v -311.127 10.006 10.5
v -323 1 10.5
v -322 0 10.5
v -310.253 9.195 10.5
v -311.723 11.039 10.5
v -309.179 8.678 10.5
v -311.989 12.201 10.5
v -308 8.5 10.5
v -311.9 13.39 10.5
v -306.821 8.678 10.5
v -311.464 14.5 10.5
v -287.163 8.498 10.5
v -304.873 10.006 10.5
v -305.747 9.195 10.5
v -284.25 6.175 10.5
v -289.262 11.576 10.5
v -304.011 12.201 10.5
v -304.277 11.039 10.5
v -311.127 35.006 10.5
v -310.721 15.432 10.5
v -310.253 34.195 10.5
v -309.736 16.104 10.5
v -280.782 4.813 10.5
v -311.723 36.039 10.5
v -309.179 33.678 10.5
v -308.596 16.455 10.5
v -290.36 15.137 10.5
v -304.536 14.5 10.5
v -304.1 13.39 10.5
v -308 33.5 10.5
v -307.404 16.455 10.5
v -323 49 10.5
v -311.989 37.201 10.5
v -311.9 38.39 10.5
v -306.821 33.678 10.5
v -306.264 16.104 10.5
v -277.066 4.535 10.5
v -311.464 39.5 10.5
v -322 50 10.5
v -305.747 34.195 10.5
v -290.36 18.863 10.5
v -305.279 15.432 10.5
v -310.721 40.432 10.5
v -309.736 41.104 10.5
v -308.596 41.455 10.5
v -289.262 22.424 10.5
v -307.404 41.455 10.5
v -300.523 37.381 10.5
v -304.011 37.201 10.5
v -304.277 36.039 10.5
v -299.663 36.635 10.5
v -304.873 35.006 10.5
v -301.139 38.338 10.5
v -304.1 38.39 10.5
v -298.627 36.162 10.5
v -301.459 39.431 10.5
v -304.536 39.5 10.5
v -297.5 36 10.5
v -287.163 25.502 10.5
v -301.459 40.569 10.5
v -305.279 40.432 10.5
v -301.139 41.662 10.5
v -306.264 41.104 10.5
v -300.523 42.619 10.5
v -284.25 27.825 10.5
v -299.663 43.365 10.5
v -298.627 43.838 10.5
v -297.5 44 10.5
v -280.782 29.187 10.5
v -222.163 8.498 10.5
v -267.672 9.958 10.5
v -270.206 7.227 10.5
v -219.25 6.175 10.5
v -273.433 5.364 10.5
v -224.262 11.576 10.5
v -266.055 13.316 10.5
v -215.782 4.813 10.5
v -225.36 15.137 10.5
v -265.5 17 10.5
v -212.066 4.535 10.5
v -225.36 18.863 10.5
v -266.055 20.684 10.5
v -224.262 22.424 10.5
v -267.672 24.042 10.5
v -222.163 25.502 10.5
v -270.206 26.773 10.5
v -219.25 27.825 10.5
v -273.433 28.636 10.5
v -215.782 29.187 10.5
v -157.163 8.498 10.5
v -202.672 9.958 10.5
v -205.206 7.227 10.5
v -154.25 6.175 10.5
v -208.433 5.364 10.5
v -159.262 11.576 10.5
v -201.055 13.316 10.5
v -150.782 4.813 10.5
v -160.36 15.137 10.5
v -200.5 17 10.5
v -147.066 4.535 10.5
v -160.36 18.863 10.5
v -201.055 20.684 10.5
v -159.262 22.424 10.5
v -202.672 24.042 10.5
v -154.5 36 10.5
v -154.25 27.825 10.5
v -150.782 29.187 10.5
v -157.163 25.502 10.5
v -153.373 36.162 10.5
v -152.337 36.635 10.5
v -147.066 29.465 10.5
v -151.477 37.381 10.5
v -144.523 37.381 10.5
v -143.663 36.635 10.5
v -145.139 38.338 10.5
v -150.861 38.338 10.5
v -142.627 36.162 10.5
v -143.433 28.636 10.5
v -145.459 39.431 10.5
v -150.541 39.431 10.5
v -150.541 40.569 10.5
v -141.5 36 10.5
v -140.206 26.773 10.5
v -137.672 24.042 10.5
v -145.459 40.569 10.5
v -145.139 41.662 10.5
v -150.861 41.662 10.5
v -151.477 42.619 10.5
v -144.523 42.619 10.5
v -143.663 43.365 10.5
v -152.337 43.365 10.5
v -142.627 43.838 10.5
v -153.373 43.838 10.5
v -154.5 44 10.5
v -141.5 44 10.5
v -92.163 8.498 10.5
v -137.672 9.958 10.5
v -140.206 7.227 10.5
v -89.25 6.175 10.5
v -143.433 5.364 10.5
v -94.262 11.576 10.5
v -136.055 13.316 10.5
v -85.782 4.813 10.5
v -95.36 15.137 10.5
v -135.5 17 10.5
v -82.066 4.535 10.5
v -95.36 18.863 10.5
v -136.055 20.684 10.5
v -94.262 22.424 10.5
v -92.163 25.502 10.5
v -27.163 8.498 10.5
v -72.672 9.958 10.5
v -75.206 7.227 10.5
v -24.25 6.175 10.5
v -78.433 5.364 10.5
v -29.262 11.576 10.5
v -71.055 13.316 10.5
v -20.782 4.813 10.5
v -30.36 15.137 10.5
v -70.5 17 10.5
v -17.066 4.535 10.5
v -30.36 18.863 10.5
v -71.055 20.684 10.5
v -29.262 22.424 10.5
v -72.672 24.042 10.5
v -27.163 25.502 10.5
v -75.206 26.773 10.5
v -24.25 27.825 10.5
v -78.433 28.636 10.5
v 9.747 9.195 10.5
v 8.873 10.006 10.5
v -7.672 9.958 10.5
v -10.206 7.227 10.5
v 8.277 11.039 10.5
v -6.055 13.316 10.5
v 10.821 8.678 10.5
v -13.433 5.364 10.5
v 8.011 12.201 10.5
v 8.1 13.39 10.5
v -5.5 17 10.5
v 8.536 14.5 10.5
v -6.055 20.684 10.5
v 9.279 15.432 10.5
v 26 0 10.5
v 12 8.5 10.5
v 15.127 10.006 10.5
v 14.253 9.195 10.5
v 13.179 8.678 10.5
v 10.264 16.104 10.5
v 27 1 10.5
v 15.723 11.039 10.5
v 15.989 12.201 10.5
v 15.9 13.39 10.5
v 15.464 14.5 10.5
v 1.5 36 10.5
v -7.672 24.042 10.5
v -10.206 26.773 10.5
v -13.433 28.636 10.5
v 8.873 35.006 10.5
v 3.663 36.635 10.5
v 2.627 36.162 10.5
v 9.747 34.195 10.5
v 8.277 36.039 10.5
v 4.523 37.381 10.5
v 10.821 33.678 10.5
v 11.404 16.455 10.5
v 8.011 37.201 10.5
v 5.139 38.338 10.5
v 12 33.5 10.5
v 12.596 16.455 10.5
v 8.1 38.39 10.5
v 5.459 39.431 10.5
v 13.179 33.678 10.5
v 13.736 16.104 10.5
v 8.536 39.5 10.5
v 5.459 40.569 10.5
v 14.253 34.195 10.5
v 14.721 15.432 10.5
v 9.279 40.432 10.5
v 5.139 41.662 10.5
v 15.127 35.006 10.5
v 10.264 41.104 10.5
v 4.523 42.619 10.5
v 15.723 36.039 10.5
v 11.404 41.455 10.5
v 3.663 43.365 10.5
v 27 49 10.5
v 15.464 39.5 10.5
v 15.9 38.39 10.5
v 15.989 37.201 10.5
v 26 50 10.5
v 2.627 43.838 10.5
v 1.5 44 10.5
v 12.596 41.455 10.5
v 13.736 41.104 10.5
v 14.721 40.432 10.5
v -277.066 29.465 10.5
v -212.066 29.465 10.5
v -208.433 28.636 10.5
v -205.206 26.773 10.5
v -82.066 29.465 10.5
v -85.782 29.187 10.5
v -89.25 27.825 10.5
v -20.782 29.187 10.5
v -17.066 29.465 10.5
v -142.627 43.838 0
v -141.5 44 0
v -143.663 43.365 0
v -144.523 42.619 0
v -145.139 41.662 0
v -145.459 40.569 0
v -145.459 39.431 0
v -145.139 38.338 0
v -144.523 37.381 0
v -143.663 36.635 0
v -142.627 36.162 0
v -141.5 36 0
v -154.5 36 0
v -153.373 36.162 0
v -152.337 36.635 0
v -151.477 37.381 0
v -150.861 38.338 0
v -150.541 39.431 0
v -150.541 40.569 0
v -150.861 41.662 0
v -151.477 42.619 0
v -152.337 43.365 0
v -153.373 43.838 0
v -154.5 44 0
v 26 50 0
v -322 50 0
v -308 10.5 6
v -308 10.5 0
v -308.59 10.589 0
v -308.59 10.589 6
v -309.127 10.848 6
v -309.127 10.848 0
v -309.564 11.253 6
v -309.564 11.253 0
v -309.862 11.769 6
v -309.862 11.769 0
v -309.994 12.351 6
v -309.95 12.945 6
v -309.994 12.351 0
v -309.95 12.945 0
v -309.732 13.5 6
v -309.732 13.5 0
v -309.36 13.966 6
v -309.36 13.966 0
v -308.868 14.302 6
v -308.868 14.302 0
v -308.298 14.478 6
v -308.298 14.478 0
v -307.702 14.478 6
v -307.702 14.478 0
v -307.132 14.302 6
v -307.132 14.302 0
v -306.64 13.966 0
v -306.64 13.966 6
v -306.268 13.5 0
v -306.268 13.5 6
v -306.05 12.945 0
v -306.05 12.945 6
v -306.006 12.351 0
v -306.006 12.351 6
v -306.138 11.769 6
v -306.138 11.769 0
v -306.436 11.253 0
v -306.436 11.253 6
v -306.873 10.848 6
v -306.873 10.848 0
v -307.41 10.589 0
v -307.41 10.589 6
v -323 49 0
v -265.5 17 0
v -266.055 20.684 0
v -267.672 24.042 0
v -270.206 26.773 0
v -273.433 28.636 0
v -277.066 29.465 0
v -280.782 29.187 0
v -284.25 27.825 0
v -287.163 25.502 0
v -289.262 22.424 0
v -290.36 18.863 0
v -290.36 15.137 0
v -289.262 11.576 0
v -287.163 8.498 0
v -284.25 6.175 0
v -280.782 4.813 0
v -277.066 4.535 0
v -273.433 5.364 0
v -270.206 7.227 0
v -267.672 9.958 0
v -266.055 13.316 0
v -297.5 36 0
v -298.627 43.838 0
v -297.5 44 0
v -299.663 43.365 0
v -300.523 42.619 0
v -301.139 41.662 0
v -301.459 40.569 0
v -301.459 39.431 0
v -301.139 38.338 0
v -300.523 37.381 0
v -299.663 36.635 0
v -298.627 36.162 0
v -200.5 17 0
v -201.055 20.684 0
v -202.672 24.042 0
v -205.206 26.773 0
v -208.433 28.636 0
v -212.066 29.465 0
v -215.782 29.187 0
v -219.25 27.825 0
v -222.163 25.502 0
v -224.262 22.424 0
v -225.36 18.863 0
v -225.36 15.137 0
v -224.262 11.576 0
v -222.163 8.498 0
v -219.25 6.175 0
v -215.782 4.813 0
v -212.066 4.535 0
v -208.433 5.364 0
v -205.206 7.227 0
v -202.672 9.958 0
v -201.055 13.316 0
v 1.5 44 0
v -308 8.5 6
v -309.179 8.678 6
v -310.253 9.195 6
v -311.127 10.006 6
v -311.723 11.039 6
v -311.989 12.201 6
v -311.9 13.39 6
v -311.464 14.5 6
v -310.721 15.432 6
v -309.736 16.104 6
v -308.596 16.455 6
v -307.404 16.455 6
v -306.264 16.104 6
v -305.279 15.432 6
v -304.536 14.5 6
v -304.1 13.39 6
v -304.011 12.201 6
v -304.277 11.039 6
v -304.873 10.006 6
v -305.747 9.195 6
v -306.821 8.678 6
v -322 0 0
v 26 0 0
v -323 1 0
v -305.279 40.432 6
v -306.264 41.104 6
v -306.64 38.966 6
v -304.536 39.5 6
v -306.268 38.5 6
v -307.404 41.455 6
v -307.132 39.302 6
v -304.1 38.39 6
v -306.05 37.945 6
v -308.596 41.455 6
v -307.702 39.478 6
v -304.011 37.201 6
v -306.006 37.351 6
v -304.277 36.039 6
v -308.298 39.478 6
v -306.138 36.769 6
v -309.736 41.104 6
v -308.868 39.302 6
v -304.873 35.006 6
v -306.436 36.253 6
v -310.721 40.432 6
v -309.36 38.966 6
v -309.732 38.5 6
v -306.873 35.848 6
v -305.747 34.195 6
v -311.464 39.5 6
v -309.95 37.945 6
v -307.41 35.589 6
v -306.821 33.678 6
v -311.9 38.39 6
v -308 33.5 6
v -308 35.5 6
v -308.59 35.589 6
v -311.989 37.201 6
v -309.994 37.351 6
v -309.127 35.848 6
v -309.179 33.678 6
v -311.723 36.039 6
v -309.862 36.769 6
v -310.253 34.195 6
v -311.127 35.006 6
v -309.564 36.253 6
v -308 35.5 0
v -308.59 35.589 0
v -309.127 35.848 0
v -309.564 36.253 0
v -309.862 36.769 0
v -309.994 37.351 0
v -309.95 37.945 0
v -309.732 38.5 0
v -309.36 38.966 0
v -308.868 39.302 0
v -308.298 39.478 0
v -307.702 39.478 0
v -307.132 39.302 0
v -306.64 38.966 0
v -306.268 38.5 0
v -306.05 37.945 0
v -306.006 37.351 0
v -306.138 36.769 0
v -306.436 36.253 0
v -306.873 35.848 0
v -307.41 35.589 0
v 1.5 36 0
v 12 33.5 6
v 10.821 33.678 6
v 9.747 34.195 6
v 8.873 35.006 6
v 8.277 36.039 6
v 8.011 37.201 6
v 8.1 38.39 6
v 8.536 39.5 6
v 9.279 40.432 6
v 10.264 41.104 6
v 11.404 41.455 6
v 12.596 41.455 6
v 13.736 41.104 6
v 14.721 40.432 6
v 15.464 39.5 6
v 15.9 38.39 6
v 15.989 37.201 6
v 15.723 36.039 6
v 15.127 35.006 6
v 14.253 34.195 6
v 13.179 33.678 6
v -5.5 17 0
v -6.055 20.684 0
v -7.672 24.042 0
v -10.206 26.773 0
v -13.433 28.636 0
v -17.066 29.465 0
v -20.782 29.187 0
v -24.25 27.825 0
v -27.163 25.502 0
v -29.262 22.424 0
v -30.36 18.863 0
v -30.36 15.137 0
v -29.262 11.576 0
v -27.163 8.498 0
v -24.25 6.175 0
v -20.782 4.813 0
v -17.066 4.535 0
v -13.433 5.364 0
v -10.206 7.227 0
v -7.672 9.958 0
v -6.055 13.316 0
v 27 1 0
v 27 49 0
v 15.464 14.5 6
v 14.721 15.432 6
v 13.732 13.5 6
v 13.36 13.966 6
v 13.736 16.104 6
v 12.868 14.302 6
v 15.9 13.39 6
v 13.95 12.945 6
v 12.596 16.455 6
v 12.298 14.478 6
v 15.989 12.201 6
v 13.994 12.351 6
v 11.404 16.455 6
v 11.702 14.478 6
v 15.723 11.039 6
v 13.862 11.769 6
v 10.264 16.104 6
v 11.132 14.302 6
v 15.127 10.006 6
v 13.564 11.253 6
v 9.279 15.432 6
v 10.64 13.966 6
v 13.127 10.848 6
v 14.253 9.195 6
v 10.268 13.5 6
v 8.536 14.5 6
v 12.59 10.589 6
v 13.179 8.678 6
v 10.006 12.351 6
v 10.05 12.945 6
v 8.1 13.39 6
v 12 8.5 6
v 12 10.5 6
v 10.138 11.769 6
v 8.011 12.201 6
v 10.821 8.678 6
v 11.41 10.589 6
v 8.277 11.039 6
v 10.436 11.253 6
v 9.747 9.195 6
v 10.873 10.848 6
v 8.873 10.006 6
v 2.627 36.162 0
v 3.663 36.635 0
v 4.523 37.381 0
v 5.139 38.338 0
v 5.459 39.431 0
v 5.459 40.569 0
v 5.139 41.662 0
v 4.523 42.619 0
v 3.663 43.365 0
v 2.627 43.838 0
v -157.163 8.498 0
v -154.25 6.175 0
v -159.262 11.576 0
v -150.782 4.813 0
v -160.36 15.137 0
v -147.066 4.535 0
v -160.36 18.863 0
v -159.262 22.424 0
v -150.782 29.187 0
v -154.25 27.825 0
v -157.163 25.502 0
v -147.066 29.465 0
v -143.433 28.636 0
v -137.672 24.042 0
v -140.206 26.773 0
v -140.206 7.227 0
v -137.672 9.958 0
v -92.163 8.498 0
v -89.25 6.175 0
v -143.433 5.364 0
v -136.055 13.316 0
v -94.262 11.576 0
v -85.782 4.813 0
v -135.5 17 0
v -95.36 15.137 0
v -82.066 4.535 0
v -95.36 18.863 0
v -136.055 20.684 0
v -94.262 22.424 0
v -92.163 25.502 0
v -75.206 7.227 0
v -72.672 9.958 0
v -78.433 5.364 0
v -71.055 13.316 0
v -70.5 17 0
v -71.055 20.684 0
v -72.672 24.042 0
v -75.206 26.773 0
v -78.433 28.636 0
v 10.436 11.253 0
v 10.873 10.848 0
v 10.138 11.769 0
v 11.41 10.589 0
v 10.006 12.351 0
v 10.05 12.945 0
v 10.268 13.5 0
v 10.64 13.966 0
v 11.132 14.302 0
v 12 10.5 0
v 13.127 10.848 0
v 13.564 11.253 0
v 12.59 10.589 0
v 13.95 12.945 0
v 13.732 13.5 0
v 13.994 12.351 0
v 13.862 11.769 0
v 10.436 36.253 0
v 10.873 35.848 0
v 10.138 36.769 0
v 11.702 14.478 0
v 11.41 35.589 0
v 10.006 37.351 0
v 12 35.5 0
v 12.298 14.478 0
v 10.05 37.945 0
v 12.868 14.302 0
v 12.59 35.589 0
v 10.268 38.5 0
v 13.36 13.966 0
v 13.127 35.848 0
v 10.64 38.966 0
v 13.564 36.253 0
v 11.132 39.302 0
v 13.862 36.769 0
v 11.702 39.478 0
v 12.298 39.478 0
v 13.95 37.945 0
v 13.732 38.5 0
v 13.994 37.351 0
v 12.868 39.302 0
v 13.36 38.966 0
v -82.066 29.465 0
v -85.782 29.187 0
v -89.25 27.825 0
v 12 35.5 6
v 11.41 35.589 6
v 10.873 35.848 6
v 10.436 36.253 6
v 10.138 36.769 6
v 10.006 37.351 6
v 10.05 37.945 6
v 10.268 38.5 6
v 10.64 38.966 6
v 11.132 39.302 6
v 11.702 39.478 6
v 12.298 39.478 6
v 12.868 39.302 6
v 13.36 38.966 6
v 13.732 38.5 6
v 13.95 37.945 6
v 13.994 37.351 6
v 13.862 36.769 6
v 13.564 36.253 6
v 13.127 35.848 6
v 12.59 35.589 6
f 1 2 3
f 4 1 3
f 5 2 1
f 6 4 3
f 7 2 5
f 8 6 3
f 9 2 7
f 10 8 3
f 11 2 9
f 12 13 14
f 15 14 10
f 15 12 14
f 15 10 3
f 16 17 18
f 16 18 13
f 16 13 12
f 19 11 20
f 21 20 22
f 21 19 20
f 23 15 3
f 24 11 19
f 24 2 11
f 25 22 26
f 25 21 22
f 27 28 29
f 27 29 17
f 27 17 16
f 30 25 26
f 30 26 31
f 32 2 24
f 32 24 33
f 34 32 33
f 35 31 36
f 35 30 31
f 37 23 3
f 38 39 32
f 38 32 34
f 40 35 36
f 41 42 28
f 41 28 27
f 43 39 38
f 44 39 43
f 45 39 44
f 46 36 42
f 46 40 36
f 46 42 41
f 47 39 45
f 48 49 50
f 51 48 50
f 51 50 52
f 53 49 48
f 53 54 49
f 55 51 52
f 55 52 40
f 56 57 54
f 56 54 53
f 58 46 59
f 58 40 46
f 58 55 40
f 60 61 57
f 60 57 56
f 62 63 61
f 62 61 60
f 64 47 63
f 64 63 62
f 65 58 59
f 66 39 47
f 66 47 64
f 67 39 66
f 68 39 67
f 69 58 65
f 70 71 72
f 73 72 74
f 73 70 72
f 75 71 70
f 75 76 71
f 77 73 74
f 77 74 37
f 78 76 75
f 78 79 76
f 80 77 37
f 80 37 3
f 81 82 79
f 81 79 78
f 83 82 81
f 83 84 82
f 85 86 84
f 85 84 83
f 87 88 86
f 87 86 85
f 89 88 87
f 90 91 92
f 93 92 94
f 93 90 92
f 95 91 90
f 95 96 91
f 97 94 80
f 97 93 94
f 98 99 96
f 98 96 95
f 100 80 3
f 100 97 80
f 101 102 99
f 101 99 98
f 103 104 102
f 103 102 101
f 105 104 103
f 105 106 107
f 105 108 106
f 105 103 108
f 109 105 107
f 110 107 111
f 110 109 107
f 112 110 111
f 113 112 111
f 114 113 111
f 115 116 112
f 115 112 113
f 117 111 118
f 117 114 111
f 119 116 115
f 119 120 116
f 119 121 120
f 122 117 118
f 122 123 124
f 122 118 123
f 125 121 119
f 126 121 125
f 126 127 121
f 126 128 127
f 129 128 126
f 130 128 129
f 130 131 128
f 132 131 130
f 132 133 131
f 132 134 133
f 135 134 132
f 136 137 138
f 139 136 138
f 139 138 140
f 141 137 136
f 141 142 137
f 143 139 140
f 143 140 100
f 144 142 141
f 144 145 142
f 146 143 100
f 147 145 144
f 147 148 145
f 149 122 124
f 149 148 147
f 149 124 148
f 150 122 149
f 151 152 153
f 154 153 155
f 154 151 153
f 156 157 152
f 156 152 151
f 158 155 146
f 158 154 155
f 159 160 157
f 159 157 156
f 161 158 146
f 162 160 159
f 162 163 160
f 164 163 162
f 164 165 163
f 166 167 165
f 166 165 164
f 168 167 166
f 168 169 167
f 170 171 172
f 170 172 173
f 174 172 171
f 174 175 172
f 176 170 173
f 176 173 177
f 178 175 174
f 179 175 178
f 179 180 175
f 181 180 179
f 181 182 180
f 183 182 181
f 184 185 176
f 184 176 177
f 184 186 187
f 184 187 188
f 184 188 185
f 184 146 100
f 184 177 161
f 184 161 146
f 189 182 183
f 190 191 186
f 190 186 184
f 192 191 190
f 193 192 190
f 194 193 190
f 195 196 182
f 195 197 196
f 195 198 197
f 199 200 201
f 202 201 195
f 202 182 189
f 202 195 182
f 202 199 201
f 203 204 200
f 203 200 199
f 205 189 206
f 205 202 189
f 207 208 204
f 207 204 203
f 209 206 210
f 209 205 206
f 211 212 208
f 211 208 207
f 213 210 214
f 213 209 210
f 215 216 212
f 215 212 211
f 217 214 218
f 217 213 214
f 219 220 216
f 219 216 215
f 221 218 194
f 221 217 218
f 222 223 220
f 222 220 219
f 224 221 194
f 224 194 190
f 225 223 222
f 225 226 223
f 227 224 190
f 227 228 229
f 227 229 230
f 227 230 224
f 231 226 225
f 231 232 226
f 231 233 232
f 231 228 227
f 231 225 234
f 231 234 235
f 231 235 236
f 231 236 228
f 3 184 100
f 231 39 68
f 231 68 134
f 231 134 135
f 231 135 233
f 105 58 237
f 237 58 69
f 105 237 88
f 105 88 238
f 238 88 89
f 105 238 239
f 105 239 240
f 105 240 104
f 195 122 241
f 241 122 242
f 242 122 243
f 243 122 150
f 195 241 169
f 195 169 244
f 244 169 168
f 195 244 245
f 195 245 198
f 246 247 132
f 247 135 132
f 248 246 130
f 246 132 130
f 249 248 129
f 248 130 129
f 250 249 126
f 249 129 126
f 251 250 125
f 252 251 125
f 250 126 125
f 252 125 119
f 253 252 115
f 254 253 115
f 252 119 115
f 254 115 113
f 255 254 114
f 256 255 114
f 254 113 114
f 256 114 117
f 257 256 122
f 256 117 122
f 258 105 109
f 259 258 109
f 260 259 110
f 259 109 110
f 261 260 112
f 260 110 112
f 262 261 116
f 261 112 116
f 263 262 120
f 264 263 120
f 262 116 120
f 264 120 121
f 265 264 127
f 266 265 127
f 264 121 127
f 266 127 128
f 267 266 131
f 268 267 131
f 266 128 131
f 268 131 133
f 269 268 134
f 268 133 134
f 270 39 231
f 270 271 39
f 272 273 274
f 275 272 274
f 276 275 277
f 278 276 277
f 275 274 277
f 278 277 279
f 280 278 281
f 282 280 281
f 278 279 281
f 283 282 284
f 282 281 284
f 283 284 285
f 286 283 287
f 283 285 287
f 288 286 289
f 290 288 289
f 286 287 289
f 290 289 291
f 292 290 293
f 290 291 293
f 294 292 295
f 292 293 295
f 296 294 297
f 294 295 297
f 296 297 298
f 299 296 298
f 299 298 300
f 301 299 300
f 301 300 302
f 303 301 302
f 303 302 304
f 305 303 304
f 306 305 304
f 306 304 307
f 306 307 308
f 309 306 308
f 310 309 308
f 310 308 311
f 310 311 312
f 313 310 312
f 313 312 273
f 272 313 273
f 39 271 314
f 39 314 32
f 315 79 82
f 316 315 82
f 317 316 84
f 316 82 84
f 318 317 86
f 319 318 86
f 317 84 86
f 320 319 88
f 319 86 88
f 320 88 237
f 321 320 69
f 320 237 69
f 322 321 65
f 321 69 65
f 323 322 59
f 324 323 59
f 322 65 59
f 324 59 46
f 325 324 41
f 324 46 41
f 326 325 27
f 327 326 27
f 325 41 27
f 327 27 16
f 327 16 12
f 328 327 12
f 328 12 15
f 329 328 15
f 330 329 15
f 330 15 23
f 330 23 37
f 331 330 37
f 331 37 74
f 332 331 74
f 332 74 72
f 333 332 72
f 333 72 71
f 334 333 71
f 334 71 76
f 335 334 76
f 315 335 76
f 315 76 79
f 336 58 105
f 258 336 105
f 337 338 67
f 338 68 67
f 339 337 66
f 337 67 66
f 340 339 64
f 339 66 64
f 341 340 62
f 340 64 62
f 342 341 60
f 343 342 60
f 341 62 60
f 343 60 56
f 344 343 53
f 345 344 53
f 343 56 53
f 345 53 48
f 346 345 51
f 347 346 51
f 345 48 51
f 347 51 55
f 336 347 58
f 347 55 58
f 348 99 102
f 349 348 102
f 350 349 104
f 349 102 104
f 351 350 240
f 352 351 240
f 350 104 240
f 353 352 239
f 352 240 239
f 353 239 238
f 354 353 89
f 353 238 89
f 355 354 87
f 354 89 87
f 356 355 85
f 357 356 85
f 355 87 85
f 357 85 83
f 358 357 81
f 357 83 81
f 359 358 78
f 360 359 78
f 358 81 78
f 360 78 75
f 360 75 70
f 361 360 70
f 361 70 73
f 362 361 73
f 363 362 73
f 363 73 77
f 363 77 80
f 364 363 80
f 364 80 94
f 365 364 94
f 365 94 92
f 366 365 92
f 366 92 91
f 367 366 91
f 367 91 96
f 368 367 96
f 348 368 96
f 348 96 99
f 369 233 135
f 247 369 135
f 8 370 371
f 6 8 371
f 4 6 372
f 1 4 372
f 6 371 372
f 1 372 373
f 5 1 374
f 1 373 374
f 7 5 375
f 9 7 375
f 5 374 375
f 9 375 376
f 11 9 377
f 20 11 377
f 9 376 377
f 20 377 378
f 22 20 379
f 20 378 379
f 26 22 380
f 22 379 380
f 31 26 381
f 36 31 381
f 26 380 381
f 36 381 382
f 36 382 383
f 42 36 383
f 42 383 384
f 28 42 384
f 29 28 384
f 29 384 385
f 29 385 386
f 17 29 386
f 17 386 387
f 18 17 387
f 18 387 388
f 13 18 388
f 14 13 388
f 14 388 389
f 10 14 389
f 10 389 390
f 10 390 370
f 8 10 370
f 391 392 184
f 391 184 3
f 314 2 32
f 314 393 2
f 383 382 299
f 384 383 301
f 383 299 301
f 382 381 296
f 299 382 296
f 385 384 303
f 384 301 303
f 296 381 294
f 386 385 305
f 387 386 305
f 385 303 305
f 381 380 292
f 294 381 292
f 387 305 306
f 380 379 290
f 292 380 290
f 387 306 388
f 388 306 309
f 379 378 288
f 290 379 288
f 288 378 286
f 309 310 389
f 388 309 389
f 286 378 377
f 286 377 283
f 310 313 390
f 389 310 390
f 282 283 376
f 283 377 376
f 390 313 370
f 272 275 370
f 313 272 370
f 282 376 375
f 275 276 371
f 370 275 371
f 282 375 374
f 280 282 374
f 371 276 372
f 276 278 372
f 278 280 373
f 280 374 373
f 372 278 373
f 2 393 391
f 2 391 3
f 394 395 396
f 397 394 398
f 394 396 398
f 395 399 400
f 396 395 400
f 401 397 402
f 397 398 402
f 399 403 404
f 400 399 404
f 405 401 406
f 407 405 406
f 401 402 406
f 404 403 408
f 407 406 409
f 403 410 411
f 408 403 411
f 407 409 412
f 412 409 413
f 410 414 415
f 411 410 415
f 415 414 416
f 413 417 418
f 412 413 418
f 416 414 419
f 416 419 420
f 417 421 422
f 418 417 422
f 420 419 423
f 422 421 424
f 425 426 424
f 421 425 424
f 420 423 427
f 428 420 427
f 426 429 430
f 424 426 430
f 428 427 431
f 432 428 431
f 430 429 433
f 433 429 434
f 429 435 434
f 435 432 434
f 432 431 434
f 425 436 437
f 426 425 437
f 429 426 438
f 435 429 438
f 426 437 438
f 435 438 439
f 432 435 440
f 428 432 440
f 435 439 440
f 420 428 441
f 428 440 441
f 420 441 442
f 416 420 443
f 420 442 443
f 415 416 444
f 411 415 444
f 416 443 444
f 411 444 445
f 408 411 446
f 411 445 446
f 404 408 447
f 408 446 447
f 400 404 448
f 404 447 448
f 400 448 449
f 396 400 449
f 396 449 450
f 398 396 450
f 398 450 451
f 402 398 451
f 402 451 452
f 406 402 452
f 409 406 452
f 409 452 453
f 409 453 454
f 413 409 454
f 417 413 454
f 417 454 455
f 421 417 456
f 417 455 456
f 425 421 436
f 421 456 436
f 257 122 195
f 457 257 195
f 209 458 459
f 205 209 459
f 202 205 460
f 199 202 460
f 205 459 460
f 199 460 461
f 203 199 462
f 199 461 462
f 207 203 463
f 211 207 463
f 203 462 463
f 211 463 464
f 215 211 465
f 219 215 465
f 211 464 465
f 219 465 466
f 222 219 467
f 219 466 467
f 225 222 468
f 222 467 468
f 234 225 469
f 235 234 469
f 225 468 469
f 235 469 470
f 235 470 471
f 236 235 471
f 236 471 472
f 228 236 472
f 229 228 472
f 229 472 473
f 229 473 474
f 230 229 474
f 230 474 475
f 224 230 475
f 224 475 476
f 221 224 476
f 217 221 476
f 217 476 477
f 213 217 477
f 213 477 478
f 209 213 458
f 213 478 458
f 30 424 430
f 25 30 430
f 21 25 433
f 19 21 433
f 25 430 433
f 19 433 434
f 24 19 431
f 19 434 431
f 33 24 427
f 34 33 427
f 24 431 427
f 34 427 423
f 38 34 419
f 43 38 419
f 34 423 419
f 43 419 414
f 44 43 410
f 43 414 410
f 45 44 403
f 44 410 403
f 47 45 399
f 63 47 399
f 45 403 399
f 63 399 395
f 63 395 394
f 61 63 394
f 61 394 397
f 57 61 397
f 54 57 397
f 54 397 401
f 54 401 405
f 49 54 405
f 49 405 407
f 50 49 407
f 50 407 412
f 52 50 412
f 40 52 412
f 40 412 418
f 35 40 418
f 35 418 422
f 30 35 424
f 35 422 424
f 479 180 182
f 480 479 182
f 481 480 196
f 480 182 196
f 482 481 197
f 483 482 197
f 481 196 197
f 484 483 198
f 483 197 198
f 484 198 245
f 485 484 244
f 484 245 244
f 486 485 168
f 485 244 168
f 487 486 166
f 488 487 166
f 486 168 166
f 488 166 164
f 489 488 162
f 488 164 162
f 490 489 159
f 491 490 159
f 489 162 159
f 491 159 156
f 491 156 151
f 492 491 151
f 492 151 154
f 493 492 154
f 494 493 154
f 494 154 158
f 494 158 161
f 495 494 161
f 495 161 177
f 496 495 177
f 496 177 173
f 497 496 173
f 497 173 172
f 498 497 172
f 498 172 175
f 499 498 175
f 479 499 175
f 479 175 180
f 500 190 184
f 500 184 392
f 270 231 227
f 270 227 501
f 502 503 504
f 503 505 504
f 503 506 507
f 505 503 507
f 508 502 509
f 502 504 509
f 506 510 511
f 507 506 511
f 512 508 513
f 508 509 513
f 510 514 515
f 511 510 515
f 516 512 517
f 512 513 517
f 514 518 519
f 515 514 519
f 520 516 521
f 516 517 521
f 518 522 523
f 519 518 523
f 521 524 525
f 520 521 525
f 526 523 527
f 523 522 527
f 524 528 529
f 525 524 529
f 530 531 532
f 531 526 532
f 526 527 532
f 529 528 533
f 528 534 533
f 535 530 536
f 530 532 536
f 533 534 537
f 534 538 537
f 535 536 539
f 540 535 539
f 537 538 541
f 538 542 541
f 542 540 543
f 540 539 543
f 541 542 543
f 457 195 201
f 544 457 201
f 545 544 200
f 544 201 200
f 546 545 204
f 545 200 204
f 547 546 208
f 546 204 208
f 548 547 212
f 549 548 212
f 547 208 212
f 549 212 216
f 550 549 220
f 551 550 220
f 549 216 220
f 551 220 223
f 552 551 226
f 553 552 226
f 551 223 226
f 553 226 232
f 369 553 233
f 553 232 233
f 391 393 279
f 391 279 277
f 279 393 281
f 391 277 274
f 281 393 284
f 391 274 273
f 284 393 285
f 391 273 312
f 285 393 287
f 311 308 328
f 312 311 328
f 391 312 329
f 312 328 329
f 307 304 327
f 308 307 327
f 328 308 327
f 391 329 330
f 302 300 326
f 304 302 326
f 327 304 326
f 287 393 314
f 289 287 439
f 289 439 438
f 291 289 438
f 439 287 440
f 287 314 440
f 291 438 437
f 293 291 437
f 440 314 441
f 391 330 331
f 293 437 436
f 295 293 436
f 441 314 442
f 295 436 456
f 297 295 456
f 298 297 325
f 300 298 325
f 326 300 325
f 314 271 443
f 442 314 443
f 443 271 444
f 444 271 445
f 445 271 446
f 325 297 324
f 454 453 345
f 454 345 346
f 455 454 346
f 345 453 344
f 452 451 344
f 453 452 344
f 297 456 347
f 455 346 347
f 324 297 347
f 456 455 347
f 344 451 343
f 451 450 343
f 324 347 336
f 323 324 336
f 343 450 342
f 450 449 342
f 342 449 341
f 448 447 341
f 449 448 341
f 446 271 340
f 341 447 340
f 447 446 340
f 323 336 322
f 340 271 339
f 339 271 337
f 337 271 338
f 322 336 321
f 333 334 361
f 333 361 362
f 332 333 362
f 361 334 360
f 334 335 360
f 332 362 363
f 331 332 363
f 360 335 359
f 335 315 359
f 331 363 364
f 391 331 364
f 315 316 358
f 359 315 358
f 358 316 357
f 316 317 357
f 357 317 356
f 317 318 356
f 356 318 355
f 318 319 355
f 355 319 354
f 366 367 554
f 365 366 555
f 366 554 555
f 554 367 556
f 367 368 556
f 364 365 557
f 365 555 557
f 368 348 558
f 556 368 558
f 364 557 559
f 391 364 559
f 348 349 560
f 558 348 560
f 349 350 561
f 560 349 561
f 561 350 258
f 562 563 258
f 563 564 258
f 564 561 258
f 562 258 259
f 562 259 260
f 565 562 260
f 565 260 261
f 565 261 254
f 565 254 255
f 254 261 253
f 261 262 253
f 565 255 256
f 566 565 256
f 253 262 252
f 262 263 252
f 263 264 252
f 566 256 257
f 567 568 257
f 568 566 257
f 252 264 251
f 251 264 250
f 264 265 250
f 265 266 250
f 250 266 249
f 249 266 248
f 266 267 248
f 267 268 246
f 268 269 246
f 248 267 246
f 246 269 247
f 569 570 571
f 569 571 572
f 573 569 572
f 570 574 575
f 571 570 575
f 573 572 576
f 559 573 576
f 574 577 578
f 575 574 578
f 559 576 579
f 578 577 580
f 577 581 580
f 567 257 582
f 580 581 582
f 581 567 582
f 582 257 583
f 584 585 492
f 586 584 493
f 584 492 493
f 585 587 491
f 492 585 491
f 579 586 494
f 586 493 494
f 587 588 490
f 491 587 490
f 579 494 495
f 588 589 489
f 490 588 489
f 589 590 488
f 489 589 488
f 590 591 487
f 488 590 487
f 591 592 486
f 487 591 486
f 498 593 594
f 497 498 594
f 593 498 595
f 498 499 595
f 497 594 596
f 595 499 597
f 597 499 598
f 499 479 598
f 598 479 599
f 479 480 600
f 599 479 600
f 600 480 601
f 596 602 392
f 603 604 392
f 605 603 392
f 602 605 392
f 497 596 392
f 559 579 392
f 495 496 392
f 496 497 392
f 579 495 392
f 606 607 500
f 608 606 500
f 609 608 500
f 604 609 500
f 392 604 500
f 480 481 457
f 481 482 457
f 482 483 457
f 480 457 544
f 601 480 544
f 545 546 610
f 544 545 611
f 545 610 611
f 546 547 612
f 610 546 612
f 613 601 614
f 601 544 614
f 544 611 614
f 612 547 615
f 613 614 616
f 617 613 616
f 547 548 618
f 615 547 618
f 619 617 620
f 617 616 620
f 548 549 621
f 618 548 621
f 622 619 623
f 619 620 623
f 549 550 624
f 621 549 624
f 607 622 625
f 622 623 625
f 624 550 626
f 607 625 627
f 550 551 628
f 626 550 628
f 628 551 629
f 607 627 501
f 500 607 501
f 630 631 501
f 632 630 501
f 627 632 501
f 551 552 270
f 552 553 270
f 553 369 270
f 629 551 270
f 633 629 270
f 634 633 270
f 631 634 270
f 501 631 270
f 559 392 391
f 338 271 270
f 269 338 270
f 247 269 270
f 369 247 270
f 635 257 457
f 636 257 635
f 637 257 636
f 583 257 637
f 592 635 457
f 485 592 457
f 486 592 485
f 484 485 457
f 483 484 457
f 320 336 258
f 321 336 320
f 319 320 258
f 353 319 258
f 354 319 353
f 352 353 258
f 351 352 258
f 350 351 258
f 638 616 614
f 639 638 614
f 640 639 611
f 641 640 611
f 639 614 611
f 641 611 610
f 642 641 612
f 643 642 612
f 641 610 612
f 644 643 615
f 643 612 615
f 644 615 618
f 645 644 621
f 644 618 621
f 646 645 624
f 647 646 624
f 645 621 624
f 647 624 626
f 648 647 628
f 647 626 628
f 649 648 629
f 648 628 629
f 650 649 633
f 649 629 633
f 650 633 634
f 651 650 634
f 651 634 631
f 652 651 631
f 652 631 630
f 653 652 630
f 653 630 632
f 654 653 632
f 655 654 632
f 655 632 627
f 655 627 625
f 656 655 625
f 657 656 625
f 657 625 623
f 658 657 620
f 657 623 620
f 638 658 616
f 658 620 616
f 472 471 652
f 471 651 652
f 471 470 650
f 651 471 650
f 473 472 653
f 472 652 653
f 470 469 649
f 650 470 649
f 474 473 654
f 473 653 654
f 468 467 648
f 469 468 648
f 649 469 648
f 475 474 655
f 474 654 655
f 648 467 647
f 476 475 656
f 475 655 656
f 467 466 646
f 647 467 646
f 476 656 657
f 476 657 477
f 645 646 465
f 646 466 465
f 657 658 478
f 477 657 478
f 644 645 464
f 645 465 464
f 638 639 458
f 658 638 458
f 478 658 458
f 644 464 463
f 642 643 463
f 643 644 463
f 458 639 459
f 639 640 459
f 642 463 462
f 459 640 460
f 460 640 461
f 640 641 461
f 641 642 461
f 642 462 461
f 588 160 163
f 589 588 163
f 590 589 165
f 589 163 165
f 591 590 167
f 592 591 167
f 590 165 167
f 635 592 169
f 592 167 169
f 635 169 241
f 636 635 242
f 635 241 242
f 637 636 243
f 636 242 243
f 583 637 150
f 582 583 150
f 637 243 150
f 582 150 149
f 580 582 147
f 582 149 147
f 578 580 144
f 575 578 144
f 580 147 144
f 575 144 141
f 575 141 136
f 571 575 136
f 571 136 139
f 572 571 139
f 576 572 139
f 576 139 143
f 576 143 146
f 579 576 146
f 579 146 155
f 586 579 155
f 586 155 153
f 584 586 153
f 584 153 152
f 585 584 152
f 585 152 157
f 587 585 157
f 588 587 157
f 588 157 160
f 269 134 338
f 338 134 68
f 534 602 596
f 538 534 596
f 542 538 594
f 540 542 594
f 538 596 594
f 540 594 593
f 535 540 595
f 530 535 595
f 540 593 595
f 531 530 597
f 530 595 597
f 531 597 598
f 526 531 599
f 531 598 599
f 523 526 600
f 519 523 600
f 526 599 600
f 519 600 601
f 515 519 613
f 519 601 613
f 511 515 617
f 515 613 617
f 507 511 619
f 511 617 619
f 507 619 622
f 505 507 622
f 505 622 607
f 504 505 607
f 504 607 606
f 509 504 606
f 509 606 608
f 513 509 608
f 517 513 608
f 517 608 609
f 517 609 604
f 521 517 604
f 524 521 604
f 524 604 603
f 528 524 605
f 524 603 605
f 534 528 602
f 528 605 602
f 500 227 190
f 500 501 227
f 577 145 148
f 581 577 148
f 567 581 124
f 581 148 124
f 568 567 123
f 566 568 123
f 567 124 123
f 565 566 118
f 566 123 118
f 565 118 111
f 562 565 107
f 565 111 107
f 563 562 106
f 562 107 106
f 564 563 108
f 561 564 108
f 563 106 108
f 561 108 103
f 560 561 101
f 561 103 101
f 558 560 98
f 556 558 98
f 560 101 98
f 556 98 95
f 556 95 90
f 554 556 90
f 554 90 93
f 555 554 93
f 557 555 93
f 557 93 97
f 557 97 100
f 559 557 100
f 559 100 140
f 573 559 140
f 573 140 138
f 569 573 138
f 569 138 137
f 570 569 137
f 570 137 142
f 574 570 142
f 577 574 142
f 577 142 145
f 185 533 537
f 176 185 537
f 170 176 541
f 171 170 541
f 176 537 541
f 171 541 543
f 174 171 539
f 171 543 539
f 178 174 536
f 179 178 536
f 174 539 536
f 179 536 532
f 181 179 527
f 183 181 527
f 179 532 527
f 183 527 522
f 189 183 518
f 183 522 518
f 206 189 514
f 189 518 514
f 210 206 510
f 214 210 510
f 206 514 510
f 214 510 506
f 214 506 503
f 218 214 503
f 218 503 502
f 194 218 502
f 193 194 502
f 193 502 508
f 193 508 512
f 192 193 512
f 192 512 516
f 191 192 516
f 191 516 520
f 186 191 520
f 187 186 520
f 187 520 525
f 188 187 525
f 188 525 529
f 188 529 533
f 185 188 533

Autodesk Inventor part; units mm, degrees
ref_plane "YZ Plane" through (0, 0, 0) normal (1, 0, 0) x (0, 1, 0)
ref_plane "XZ Plane" through (0, 0, 0) normal (0, 1, 0) x (-1, 0, 0)
ref_plane "XY Plane" through (0, 0, 0) normal (0, 0, 1) x (1, 0, 0)
sketch "Esboço1" plane through (0, 0, 0) normal (0, 0, 1) x (1, 0, 0)
  line L0 (-293, 0) -> (-323, 0) construction
  line L1 (-323, 0) -> (-323, 50) construction
  line L2 (27, 0) -> (27, 50) construction
  line L3 (27, 0) -> (0, 0) construction
  line L4 (-3, 50) -> (27, 50) construction
  line L5 (-323, 50) -> (-293, 50) construction
  line L6 (27, 0) -> (-323, 0)
  line L7 (-323, 0) -> (-323, 50)
  line L8 (-323, 50) -> (27, 50)
  line L9 (27, 50) -> (27, 0)
extrude "bloco principal" add sketch "Esboço1" along normal blind 10.5
sketch "Esboço4" plane through (0, 0, 10.5) normal (0, 0, 1) x (1, 0, 0)
  line L0 (27, 0) -> (27, 50) projected
  line L1 (27, 40) -> (-323, 40) construction
  line L2 (-323, 50) -> (-323, 0) projected
  line L3 (5.5, 40) -> (-145.5, 40) construction
  line L4 (1.5, 44) -> (-141.5, 44)
  line L5 (-141.5, 36) -> (1.5, 36)
  arc A0 (1.5, 36) -> (1.5, 44) centre (1.5, 40) ccw
  arc A1 (-141.5, 44) -> (-141.5, 36) centre (-141.5, 40) ccw
  line L6 (-150.5, 40) -> (-301.5, 40) construction
  line L7 (-154.5, 44) -> (-297.5, 44)
  line L8 (-297.5, 36) -> (-154.5, 36)
  arc A2 (-154.5, 36) -> (-154.5, 44) centre (-154.5, 40) ccw
  arc A3 (-297.5, 44) -> (-297.5, 36) centre (-297.5, 40) ccw
  line L9 (-323, 0) -> (27, 0) projected
  line L10 (27, 50) -> (-323, 50) projected
  point P0 (0, 0)
  point P1 (-70, 40)
  point P2 (-226, 40)
  dimension "d39" = 97
  dimension "d40" = 97
  dimension "d41" = 8
  dimension "d42" = 8
  dimension "d43" = 143
  dimension "d44" = 143
  dimension "d46" = 10
extrude "fenda" cut sketch "Esboço4" against normal through all contours A0 L5 A1 L4 | A2 L8 A3 L7
sketch "Esboço5" plane through (0, 0, 10.5) normal (0, 0, 1) x (1, 0, 0)
  line L0 (27, 0) -> (27, 50) projected
  line L1 (27, 17) -> (-323, 17) construction
  line L2 (-323, 50) -> (-323, 0) projected
  circle A0 centre (-148, 17) radius 12.5
  circle A1 centre (-213, 17) radius 12.5
  circle A2 centre (-278, 17) radius 12.5
  circle A3 centre (-83, 17) radius 12.5
  circle A4 centre (-148, 17) radius 12.5 construction
  circle A5 centre (-213, 17) radius 12.5 construction
  circle A6 centre (-18, 17) radius 12.5
  circle A7 centre (-83, 17) radius 12.5 construction
  circle A8 centre (-148, 17) radius 12.5 construction
  line L3 (-323, 0) -> (27, 0) projected
  point P0 (0, 0)
  dimension "d51" = 65
  dimension "d54" = 65
  dimension "d57" = 17
  dimension "d58" = 25
extrude "furos traseiros" cut sketch "Esboço5" against normal through all
sketch "Esboço6" plane through (0, 0, 10.5) normal (0, 0, 1) x (1, 0, 0)
  circle A0 centre (-308, 12.5) radius 1.621 construction
  circle A1 centre (-308, 37.5) radius 1.621 construction
  circle A2 centre (12, 12.5) radius 1.621 construction
  circle A3 centre (12, 37.5) radius 1.621 construction
  point P0 (0, 0)
hole "furos fixação" at (-308, 12.5, 10.5) at (-308, 37.5, 10.5) at (12, 12.5, 10.5) at (12, 37.5, 10.5) direction (0, 0, -1) diameter 4 end through all counterbore diameter 8 counterbore depth 4.5
chamfer "Chanfro1" distance 1 angle 45 4 edges at (27, 0, 5.25) (27, 50, 5.25) (-323, 50, 5.25) (-323, 0, 5.25)
equation "\"d40\" = d39"
equation "\"d41\" = d42"
equation "\"d44\" = d43"
properties part number "SuportePincasBlocoFabricado"
